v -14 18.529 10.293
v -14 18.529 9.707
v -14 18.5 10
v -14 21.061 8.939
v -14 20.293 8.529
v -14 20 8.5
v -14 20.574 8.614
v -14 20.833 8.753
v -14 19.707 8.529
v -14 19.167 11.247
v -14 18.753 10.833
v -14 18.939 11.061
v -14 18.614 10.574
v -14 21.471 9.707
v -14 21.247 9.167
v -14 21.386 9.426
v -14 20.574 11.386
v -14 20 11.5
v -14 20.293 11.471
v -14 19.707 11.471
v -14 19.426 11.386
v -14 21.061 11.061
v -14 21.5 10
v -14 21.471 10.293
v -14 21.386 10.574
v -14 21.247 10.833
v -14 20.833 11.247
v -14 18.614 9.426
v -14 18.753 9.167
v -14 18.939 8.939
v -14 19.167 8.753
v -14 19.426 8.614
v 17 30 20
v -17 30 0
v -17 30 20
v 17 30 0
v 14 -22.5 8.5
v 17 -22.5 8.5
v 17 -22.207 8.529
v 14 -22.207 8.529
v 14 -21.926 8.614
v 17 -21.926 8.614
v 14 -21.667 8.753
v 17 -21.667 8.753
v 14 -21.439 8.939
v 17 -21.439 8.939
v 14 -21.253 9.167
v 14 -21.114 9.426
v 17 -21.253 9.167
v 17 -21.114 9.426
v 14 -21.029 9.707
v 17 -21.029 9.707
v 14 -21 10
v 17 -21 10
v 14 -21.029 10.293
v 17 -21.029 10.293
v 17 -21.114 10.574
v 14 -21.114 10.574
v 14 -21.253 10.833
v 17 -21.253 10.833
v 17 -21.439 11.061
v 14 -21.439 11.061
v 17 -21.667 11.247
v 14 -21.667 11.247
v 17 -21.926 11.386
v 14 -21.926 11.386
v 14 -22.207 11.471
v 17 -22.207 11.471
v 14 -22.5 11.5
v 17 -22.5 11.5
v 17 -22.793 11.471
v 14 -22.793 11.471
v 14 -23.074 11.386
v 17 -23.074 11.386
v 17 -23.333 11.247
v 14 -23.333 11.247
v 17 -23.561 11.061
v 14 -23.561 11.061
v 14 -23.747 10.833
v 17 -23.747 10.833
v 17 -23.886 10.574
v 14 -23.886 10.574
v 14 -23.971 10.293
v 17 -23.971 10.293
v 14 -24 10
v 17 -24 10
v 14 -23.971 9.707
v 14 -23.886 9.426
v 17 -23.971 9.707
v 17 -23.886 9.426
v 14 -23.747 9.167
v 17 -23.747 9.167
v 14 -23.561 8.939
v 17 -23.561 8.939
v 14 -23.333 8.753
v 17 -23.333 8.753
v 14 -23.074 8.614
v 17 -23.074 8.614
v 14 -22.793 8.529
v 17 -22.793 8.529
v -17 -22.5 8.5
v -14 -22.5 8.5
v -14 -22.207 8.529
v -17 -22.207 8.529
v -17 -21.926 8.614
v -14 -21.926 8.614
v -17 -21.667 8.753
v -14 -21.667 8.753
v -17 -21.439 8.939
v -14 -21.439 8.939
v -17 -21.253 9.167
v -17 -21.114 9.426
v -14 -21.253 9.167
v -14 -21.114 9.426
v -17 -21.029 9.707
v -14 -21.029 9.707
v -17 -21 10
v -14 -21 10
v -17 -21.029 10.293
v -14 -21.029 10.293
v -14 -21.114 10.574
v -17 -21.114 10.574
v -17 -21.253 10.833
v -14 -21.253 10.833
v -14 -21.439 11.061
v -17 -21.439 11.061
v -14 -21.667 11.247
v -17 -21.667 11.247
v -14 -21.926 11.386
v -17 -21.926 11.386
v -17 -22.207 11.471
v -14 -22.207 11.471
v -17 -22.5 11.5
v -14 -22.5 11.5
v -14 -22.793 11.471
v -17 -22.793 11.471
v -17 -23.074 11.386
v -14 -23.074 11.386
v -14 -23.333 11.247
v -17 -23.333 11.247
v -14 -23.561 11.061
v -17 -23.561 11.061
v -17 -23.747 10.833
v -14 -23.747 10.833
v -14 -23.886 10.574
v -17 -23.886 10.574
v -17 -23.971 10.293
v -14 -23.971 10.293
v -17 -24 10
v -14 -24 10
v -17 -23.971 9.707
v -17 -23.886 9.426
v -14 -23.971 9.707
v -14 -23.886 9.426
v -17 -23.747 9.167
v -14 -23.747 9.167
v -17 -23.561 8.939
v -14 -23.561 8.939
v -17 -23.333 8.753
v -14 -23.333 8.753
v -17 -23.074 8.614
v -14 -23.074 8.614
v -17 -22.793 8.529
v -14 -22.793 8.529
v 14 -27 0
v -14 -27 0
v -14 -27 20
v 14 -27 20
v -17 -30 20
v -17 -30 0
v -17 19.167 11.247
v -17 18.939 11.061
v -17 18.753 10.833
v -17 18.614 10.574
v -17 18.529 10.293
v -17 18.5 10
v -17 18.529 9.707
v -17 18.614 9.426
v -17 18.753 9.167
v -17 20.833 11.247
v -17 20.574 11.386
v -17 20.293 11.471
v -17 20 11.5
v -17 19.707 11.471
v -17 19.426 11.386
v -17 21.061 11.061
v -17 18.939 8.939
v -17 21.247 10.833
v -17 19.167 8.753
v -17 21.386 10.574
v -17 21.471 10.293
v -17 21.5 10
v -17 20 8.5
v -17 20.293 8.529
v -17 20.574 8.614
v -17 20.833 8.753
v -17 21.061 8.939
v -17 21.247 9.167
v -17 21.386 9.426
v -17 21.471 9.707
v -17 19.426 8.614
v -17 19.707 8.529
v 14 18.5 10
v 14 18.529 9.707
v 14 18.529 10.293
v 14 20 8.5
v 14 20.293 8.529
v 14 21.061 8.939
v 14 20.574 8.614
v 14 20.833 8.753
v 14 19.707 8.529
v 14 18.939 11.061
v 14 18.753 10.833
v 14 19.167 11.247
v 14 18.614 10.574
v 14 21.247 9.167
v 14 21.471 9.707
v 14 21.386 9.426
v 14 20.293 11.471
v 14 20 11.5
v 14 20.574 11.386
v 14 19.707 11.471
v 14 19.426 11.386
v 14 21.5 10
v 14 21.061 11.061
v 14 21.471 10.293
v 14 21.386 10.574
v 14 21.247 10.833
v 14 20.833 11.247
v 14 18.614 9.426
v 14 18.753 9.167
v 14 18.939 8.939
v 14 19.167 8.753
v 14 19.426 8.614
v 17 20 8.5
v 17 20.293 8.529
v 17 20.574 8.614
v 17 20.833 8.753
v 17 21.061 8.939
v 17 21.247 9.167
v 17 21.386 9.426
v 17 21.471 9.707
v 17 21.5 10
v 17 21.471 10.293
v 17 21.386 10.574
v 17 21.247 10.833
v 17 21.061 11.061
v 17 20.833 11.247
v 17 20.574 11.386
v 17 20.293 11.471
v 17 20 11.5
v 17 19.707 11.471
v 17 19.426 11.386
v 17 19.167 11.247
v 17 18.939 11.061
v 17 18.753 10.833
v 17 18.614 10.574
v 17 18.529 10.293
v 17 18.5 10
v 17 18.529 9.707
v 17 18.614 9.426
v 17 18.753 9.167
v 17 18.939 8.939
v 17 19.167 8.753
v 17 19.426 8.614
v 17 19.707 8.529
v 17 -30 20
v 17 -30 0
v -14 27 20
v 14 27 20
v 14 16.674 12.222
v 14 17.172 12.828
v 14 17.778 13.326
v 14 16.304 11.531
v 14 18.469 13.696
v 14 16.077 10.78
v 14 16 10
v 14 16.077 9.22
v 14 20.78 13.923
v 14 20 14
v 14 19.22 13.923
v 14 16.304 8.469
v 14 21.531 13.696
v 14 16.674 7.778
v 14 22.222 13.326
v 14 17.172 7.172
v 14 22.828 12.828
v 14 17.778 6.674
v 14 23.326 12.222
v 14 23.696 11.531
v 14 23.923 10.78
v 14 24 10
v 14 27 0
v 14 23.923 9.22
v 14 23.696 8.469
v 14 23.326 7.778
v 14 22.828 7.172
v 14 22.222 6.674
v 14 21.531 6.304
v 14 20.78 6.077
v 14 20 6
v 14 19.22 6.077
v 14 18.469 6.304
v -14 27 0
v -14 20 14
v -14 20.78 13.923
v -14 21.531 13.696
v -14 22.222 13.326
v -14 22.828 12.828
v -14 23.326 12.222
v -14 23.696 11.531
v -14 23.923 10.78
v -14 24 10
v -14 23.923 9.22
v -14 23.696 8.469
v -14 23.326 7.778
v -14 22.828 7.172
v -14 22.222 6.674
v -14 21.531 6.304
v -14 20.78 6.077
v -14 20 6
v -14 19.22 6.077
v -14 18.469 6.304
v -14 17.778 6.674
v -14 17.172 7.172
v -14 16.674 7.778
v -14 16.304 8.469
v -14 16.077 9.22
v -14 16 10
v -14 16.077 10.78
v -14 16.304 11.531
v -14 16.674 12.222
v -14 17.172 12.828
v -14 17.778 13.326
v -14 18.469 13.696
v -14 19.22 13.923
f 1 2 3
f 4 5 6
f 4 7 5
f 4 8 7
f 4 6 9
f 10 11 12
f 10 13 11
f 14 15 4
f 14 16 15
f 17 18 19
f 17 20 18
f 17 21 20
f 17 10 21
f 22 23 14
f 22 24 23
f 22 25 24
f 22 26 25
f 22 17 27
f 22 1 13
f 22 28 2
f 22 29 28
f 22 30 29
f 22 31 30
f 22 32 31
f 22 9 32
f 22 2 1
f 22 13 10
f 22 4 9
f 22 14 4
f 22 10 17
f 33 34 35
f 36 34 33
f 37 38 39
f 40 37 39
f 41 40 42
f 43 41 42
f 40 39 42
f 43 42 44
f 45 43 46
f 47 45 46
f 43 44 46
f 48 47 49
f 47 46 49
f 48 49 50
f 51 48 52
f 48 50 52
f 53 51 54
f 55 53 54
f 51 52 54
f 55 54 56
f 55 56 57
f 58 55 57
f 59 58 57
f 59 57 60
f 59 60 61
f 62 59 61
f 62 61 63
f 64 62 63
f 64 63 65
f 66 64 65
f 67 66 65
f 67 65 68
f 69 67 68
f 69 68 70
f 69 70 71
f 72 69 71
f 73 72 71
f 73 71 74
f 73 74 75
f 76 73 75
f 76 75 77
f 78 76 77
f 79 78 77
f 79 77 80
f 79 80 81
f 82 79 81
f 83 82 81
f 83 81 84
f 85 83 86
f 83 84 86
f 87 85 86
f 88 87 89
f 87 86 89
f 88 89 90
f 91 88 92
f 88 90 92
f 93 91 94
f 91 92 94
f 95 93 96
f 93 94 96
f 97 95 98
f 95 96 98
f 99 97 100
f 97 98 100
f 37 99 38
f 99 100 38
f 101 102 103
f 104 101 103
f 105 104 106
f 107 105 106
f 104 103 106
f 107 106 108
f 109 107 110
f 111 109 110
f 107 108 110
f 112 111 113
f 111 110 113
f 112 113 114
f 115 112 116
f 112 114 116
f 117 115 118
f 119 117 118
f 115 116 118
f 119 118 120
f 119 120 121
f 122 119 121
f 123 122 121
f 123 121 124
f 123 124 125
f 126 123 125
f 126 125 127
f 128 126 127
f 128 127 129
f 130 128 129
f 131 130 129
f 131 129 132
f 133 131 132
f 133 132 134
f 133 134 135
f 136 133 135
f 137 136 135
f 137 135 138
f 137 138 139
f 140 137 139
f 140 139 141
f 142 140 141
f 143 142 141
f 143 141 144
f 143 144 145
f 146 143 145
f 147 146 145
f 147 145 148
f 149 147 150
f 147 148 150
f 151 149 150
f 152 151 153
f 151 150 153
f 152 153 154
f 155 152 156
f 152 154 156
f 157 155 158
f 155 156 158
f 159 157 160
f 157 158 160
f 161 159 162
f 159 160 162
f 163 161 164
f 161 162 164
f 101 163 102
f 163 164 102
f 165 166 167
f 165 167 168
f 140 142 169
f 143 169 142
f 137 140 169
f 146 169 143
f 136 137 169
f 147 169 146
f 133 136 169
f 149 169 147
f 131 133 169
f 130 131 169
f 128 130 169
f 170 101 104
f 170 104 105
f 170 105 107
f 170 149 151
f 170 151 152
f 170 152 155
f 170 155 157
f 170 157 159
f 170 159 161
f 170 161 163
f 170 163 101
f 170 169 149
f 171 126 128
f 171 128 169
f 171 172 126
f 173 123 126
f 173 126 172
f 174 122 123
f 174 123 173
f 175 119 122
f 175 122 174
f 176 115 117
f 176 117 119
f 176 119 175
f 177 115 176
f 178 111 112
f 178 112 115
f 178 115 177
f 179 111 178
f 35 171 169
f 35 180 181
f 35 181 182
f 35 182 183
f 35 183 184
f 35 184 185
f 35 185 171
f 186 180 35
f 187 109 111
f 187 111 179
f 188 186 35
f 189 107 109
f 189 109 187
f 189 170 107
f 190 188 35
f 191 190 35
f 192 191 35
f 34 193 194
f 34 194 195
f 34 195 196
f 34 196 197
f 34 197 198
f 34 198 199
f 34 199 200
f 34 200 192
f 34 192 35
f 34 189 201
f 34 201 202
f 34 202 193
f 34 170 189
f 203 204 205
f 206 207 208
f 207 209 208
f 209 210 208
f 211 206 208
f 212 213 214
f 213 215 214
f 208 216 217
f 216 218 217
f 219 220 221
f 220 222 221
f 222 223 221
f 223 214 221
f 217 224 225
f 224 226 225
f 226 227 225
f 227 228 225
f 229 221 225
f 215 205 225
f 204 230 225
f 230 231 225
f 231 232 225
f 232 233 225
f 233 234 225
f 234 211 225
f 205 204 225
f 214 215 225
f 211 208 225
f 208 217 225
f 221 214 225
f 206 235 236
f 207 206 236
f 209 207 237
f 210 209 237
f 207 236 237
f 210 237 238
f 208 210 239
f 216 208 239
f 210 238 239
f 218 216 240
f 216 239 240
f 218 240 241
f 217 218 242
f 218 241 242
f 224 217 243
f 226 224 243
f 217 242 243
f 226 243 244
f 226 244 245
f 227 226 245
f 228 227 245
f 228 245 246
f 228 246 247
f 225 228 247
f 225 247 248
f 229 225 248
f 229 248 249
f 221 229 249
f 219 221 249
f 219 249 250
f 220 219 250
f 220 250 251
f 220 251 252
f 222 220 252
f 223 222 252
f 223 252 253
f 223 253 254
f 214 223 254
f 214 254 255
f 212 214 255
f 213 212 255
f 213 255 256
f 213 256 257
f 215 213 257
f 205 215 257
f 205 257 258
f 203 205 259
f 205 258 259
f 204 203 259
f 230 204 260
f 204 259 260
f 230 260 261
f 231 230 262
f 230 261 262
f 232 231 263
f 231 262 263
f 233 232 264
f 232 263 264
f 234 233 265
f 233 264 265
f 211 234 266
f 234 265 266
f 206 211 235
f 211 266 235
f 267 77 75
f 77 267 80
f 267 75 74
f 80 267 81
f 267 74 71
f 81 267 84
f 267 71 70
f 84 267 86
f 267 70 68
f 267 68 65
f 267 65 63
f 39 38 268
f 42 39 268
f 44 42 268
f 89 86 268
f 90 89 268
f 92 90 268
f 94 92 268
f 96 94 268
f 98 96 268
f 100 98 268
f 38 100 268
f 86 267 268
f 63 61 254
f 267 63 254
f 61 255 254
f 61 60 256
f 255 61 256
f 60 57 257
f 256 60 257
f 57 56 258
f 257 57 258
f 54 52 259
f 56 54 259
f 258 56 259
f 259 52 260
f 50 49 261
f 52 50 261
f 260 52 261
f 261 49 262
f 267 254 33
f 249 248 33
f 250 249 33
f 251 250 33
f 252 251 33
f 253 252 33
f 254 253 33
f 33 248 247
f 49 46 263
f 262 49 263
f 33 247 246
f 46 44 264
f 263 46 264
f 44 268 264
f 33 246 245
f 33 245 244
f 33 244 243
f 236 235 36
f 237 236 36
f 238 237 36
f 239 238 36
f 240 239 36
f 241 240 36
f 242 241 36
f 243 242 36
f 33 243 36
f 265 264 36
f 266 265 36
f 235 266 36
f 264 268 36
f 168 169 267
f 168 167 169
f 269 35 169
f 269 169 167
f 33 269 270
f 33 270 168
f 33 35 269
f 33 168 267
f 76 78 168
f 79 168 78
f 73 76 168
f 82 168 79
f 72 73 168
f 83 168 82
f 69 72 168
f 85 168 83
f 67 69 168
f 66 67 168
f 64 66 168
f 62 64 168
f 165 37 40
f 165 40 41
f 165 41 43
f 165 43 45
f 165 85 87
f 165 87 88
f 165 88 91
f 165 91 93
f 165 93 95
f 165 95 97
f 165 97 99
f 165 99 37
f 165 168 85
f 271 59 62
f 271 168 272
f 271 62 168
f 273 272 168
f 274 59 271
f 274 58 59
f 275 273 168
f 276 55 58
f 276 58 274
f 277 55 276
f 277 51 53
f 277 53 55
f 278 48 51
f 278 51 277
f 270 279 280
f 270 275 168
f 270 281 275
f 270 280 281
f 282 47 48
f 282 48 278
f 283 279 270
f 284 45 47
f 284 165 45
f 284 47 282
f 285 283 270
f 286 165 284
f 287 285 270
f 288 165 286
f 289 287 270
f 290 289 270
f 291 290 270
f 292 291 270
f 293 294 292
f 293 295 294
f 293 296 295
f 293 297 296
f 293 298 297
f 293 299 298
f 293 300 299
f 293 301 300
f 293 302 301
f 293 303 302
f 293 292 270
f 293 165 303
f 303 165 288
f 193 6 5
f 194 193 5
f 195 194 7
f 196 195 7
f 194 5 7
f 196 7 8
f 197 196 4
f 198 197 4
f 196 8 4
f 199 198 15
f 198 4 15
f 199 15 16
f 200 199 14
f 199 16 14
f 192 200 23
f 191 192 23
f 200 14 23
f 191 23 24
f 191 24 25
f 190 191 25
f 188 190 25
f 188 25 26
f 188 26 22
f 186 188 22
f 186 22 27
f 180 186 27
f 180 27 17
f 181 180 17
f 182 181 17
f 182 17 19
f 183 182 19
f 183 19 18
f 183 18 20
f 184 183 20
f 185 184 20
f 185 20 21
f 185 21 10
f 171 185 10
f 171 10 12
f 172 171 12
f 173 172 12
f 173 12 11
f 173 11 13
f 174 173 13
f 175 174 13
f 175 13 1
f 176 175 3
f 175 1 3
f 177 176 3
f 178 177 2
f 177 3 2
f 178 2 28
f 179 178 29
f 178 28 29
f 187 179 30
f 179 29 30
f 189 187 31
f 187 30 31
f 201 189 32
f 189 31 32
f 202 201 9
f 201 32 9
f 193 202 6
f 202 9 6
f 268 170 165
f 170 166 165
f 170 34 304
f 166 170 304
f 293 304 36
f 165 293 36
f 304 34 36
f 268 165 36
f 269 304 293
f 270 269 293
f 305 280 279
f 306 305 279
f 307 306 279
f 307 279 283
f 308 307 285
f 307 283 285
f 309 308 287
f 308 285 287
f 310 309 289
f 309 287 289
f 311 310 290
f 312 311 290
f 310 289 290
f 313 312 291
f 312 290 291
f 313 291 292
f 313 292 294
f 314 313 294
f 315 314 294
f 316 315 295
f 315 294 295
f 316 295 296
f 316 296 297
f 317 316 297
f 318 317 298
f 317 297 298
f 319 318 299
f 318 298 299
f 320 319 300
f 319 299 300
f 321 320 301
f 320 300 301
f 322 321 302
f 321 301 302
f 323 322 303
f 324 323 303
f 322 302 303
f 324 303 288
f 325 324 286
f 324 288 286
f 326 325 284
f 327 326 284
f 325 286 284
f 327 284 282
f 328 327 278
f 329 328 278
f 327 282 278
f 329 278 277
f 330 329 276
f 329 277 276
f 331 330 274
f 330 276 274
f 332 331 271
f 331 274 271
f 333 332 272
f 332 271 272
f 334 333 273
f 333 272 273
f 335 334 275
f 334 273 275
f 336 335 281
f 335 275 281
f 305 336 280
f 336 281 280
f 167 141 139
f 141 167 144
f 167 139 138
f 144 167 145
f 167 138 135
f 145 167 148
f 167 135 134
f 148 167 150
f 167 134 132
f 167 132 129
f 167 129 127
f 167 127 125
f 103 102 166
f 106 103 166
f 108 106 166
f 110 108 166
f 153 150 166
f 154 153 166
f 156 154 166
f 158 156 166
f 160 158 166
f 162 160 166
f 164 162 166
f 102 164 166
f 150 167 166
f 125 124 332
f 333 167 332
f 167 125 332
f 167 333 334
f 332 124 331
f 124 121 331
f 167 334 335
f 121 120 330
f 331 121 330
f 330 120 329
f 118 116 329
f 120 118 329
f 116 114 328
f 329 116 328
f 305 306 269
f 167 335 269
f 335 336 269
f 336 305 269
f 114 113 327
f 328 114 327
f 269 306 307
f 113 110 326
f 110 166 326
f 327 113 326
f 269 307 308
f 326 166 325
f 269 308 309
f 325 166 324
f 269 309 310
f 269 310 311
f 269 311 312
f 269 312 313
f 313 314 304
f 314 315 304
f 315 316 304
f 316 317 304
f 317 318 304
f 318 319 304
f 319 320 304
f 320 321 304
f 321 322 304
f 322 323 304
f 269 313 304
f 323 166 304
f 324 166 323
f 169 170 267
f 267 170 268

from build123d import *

# Parameters (mm, degrees)
SKETCH1_W               = 34
SKETCH1_H               = 60
SKETCH1_W_2             = 28
SKETCH1_H_2             = 54
BOSS_EXTRUDE1_DEPTH     = 20
SKETCH2_R               = 1.5
CUT_EXTRUDE1_DEPTH      = 1
CUT_EXTRUDE1_DEPTH_BACK = 35
SKETCH4_R               = 4
BOSS_EXTRUDE2_DEPTH     = 28


with BuildPart() as part:
    # Sketch1 → Boss-Extrude1 (new body)
    with BuildSketch(Plane.XY):
        Rectangle(SKETCH1_W, SKETCH1_H)
        Rectangle(SKETCH1_W_2, SKETCH1_H_2, mode=Mode.SUBTRACT)
    extrude(amount=BOSS_EXTRUDE1_DEPTH)

    # Sketch2 → Cut-Extrude1 (cut, two sides)
    with BuildSketch(Plane(origin=(17, 0, 0), x_dir=(0, 0, -1), z_dir=(1, 0, 0))) as cut_extrude1_sk:
        with Locations((-10, -22.5)):
            Circle(SKETCH2_R)
        with Locations((-10, 20)):
            Circle(SKETCH2_R)
    extrude(amount=CUT_EXTRUDE1_DEPTH, mode=Mode.SUBTRACT)
    extrude(cut_extrude1_sk.sketch, amount=-CUT_EXTRUDE1_DEPTH_BACK, mode=Mode.SUBTRACT)

    # Sketch4 → Boss-Extrude2 (add)
    with BuildSketch(Plane.ZY.offset(-14)):
        with Locations((10, 20)):
            Circle(SKETCH4_R)
    extrude(amount=BOSS_EXTRUDE2_DEPTH)


solid = part.part
